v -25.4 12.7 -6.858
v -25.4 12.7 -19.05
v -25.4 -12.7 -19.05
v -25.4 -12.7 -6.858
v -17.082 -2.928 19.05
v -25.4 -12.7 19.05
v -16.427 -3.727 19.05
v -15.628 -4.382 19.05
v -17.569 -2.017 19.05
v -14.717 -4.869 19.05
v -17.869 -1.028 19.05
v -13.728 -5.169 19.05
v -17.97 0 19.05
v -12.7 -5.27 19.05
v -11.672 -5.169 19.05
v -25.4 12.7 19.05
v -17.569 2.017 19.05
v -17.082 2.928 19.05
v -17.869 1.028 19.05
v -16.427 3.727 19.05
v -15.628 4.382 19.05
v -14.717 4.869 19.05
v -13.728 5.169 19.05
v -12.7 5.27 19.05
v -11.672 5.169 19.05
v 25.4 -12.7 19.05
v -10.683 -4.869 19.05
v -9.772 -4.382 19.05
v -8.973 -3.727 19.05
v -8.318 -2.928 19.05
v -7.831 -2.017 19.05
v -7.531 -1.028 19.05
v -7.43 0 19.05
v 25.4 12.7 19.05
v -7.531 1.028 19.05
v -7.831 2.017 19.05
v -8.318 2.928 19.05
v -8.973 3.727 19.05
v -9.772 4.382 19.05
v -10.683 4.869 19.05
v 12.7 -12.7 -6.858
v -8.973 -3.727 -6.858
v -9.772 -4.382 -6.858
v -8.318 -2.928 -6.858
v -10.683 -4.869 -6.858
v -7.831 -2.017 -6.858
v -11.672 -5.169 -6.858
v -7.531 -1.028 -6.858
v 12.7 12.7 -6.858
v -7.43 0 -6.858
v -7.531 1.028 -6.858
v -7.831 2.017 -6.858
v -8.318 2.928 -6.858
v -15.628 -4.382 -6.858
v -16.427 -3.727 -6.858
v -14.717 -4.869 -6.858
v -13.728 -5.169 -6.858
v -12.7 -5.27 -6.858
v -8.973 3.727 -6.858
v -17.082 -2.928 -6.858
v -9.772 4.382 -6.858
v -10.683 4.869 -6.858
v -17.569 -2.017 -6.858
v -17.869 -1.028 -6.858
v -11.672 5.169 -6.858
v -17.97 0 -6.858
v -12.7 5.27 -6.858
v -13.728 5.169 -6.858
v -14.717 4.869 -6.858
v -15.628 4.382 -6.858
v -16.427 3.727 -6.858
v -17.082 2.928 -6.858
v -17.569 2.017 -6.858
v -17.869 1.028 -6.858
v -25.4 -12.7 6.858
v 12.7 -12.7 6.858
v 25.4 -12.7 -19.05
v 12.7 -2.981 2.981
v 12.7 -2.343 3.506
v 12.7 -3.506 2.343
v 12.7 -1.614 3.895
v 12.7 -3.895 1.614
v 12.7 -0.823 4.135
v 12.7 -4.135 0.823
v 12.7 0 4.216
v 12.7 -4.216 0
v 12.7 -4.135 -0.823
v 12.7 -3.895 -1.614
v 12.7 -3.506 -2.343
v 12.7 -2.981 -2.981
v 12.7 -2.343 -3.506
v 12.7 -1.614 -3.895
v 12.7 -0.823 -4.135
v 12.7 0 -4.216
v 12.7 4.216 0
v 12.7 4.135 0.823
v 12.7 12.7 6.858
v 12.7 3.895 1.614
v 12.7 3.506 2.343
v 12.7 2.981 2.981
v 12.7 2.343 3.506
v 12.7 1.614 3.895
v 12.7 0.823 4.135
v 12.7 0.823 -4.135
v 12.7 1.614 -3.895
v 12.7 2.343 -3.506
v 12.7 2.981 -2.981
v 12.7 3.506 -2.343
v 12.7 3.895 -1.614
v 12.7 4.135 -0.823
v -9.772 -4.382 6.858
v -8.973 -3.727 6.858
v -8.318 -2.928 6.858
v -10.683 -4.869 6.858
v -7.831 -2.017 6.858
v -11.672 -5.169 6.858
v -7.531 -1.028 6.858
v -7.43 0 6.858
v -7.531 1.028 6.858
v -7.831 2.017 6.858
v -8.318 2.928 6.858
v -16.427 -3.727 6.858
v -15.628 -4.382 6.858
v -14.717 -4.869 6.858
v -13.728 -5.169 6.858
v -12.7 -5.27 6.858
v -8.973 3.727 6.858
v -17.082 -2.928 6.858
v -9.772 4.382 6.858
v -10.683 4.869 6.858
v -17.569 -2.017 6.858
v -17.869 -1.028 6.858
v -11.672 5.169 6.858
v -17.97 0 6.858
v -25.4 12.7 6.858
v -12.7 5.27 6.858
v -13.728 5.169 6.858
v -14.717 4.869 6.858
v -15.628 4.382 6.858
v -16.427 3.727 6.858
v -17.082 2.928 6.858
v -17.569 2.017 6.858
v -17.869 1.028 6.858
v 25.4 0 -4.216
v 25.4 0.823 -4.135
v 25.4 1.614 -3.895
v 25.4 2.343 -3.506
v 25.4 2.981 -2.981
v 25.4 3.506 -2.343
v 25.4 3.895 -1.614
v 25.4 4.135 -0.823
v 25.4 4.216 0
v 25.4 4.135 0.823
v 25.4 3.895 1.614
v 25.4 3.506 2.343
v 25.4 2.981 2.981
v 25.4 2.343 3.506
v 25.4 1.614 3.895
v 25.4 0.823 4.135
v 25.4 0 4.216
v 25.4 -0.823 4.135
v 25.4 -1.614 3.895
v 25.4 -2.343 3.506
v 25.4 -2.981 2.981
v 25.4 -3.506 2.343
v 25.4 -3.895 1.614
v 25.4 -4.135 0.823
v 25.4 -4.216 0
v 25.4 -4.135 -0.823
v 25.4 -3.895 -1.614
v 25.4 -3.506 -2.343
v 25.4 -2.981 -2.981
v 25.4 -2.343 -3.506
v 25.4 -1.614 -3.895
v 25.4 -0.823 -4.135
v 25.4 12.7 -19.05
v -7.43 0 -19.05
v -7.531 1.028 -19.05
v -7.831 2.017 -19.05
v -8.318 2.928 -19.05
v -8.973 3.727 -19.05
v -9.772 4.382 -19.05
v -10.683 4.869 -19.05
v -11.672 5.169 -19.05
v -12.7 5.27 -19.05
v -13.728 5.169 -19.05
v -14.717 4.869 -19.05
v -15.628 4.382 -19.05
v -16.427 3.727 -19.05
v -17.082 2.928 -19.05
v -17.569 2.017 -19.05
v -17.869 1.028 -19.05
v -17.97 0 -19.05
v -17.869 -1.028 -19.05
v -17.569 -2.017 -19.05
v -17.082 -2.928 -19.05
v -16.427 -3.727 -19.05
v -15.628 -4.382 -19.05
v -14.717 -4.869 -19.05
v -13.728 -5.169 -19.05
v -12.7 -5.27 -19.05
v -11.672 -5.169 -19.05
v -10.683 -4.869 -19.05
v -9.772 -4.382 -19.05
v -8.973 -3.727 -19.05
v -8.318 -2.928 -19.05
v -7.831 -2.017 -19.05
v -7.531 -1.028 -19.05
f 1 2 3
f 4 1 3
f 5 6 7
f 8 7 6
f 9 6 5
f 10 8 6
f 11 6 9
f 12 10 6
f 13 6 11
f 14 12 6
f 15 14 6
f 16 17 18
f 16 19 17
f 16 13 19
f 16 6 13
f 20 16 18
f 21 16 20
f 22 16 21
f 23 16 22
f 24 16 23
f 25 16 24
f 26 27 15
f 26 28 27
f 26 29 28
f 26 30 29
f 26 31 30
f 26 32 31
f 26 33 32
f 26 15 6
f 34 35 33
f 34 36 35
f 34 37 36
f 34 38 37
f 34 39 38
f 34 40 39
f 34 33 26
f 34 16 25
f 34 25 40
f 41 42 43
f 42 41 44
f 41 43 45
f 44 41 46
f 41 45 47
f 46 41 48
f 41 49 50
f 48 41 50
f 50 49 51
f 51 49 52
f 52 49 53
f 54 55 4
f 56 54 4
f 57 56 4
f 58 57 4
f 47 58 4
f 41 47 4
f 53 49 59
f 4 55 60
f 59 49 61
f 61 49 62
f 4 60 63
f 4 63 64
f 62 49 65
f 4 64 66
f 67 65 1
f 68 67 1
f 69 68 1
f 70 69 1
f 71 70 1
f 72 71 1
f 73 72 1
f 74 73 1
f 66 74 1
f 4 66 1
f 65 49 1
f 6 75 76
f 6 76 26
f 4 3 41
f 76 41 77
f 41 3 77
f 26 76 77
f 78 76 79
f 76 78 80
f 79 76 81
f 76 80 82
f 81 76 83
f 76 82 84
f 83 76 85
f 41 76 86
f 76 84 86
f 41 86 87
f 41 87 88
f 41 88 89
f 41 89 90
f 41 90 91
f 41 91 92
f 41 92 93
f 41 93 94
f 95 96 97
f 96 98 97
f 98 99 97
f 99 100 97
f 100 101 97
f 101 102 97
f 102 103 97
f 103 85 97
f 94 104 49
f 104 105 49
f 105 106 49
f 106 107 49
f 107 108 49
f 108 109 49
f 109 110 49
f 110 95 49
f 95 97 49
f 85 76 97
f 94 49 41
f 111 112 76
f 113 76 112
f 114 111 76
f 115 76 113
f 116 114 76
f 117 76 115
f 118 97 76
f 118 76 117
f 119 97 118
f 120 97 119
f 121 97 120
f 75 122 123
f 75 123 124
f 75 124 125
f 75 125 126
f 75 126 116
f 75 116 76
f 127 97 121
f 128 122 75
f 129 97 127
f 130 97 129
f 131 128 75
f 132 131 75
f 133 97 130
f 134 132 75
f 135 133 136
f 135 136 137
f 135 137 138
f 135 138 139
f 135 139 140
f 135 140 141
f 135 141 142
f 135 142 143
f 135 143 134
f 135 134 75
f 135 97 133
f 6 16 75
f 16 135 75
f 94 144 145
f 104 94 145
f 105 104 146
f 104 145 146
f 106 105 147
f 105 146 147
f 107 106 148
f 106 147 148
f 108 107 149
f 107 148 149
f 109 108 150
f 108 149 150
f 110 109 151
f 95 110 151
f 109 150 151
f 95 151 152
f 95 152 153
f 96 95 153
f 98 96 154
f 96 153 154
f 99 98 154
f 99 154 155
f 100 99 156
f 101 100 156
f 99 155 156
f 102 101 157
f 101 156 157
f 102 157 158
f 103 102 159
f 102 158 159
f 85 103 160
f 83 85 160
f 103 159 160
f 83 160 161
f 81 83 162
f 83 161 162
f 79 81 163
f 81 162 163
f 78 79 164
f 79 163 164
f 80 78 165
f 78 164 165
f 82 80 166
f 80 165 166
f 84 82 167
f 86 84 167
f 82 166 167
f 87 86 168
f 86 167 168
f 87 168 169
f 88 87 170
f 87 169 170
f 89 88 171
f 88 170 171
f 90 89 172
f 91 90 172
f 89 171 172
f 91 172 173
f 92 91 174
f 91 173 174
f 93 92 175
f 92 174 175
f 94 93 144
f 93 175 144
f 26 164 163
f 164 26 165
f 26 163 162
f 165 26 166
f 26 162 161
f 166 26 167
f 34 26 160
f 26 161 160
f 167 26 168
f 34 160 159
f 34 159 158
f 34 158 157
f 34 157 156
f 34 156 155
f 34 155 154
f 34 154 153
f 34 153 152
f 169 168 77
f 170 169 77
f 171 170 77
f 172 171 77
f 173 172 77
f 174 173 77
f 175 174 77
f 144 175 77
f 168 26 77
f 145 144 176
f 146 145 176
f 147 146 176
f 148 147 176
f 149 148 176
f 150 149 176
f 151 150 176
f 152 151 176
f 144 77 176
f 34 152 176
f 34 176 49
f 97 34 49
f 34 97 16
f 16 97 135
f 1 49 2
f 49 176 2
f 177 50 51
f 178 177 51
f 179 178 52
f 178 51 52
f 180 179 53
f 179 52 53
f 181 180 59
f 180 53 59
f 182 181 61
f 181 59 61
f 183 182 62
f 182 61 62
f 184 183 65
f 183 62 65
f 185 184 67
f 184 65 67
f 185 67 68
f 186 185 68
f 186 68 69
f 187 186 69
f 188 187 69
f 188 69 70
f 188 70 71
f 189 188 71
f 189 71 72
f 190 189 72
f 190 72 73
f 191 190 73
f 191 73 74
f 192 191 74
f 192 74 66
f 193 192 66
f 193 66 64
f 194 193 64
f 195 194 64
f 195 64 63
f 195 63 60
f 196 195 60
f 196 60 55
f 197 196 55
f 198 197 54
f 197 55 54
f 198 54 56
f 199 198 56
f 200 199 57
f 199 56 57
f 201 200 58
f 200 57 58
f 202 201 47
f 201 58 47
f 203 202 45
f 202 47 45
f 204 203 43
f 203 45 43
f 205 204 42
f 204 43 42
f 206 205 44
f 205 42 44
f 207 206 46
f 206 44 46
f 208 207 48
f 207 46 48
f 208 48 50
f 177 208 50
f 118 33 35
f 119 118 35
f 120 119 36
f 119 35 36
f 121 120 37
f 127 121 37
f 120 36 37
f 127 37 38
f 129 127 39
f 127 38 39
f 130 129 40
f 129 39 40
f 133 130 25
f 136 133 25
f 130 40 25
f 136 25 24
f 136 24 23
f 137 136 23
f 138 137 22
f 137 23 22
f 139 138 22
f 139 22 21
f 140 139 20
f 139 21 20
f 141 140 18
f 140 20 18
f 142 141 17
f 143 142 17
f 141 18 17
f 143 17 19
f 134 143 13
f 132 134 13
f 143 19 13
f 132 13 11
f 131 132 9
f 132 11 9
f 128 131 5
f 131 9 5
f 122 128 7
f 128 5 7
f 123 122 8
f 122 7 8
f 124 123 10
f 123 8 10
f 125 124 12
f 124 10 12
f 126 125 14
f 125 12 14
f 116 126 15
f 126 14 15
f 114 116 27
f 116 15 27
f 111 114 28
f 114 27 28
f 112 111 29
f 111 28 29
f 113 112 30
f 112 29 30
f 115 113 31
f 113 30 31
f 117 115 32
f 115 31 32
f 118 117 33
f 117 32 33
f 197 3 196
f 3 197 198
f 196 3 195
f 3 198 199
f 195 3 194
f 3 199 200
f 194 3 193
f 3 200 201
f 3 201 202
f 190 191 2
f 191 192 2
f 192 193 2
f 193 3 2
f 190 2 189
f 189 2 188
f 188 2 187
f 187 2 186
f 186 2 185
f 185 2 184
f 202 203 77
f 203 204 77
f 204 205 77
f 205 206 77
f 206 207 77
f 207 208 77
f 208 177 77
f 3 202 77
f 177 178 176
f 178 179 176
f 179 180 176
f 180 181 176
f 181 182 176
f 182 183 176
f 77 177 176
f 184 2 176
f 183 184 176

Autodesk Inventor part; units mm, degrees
ref_plane "YZ Plane" through (0, 0, 0) normal (1, 0, 0) x (0, 1, 0)
sketch "Sketch2" plane through (0, 0, 0) normal (0, 0, 1) x (1, 0, 0)
  line L0 (-25.4, -12.7) -> (25.4, -12.7)
  line L1 (25.4, -12.7) -> (25.4, 12.7)
  line L2 (25.4, 12.7) -> (-25.4, 12.7)
  line L3 (-25.4, 12.7) -> (-25.4, -12.7)
  line L4 (-25.4, -12.7) -> (25.4, 12.7) construction
  line L5 (25.4, -12.7) -> (-25.4, 12.7) construction
  point P0 (0, 0)
  dimension "d4" = 50.8
  dimension "d5" = 25.4
extrude "Extrusion2" add sketch "Sketch2" along normal mid plane 38.1
sketch "Sketch3" plane through (-25.4, 12.7, 19.05) normal (0, 1, 0) x (1, 0, 0)
  line L0 (0, 0) -> (0, 38.1) construction
  line L1 (38.1, 19.05) -> (38.1, 25.908)
  line L2 (38.1, 25.908) -> (0, 25.908)
  line L3 (0, 25.908) -> (0, 19.05)
  line L4 (0, 0) -> (0, 25.4) construction
  line L5 (38.1, 19.05) -> (38.1, 12.192)
  line L6 (38.1, 12.192) -> (0, 12.192)
  line L7 (0, 12.192) -> (0, 19.05)
  line L8 (50.8, 0) -> (0, 0) projected
  point P0 (25.4, 19.05)
  dimension "d8" = 38.1
  dimension "d10" = 13.716
  dimension "d34" = 12.192
extrude "Extrusion3" cut sketch "Sketch3" against normal through all
sketch "Sketch4" plane through (0, 0, 19.05) normal (0, 0, 1) x (1, 0, 0)
  circle A0 centre (-12.7, 0) radius 5.2705
  line L0 (-25.4, 12.7) -> (-25.4, -12.7) projected
  point P0 (0, 0)
  dimension "d13" = 10.541
  dimension "d14" = 12.7
extrude "Extrusion4" cut sketch "Sketch4" against normal through all
sketch "Sketch5" plane through (25.4, -12.7, 19.05) normal (1, 0, 0) x (0, 0, -1)
  circle A0 centre (19.05, 12.7) radius 4.2164
  dimension "d27" = 8.4328
extrude "Extrusion5" cut sketch "Sketch5" against normal blind 12.7
properties part number "piston" material "PET Plastic"
